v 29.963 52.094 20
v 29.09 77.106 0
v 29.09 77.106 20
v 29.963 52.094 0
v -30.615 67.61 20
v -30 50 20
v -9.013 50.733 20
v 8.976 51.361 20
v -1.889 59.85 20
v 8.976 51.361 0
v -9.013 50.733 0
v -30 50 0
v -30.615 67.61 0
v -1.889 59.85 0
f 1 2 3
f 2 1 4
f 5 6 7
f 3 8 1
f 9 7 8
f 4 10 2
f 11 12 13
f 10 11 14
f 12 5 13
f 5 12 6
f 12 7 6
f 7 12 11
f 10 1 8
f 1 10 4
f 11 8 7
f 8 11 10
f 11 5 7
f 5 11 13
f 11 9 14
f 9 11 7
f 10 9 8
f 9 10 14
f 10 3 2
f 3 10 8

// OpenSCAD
translate([-30,50,0])
scale([3,3,1])
rotate([0,0,+2]) {
    difference() {
        cube([20, 20, 20]);
        translate([7, 0, -1]) {
            rotate([0,0,50]) {
                cube([30, 30, 30]);
            }
        }
        translate([13, 0, -1]) {
            rotate([0,0,50]) {
                cube([30, 30, 30]);
            }
        }
    }
}
